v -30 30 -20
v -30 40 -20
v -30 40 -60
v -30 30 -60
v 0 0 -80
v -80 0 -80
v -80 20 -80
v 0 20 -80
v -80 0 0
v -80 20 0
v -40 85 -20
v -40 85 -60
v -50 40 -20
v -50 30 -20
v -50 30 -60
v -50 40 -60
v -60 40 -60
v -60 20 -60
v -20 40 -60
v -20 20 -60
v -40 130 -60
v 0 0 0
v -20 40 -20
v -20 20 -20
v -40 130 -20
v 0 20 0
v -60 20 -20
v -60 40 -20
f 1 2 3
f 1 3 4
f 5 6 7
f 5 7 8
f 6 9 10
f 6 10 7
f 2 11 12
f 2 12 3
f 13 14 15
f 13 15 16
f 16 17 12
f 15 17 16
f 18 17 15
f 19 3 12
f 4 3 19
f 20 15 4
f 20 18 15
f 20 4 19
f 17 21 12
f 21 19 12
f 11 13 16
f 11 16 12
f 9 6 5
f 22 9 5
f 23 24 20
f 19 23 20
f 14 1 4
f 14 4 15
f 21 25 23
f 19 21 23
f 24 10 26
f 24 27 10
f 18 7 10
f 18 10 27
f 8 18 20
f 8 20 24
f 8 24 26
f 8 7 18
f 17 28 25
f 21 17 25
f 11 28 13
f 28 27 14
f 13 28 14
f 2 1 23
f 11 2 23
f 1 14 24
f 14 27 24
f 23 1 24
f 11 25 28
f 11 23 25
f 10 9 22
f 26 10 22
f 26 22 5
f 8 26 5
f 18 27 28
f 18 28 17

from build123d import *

# Parameters (mm, degrees)
SKETCH1_W      = 80
SKETCH1_H      = 80
EXTRUDE1_DEPTH = 20
SKETCH2_W      = 40
SKETCH2_H      = 40
EXTRUDE2_DEPTH = 110
EXTRUDE3_DEPTH = 110


with BuildPart() as part:
    # Sketch1 → Extrude1 (new body)
    with BuildSketch(Plane(origin=(0, 0, 0), x_dir=(1, 0, 0), z_dir=(0, 1, 0))):
        with Locations((-40, 40)):
            Rectangle(SKETCH1_W, SKETCH1_H)
    extrude(amount=EXTRUDE1_DEPTH)

    # Sketch2 → Extrude2 (add)
    with BuildSketch(Plane(origin=(0, 20, 0), x_dir=(1, 0, 0), z_dir=(0, 1, 0))):
        with Locations((-40, 40)):
            Rectangle(SKETCH2_W, SKETCH2_H)
    extrude(amount=EXTRUDE2_DEPTH)

    # Sketch3 → Extrude3 (cut)
    with BuildSketch(Plane.XY.offset(-20)):
        Polygon((-60, 40), (-40, 130), (-60, 130), align=None)
        Polygon((-40, 130), (-20, 40), (-20, 130), align=None)
        Polygon((-50, 40), (-40, 85), (-30, 40), (-30, 30), (-50, 30), align=None)
    extrude(amount=-EXTRUDE3_DEPTH, mode=Mode.SUBTRACT)


solid = part.part
